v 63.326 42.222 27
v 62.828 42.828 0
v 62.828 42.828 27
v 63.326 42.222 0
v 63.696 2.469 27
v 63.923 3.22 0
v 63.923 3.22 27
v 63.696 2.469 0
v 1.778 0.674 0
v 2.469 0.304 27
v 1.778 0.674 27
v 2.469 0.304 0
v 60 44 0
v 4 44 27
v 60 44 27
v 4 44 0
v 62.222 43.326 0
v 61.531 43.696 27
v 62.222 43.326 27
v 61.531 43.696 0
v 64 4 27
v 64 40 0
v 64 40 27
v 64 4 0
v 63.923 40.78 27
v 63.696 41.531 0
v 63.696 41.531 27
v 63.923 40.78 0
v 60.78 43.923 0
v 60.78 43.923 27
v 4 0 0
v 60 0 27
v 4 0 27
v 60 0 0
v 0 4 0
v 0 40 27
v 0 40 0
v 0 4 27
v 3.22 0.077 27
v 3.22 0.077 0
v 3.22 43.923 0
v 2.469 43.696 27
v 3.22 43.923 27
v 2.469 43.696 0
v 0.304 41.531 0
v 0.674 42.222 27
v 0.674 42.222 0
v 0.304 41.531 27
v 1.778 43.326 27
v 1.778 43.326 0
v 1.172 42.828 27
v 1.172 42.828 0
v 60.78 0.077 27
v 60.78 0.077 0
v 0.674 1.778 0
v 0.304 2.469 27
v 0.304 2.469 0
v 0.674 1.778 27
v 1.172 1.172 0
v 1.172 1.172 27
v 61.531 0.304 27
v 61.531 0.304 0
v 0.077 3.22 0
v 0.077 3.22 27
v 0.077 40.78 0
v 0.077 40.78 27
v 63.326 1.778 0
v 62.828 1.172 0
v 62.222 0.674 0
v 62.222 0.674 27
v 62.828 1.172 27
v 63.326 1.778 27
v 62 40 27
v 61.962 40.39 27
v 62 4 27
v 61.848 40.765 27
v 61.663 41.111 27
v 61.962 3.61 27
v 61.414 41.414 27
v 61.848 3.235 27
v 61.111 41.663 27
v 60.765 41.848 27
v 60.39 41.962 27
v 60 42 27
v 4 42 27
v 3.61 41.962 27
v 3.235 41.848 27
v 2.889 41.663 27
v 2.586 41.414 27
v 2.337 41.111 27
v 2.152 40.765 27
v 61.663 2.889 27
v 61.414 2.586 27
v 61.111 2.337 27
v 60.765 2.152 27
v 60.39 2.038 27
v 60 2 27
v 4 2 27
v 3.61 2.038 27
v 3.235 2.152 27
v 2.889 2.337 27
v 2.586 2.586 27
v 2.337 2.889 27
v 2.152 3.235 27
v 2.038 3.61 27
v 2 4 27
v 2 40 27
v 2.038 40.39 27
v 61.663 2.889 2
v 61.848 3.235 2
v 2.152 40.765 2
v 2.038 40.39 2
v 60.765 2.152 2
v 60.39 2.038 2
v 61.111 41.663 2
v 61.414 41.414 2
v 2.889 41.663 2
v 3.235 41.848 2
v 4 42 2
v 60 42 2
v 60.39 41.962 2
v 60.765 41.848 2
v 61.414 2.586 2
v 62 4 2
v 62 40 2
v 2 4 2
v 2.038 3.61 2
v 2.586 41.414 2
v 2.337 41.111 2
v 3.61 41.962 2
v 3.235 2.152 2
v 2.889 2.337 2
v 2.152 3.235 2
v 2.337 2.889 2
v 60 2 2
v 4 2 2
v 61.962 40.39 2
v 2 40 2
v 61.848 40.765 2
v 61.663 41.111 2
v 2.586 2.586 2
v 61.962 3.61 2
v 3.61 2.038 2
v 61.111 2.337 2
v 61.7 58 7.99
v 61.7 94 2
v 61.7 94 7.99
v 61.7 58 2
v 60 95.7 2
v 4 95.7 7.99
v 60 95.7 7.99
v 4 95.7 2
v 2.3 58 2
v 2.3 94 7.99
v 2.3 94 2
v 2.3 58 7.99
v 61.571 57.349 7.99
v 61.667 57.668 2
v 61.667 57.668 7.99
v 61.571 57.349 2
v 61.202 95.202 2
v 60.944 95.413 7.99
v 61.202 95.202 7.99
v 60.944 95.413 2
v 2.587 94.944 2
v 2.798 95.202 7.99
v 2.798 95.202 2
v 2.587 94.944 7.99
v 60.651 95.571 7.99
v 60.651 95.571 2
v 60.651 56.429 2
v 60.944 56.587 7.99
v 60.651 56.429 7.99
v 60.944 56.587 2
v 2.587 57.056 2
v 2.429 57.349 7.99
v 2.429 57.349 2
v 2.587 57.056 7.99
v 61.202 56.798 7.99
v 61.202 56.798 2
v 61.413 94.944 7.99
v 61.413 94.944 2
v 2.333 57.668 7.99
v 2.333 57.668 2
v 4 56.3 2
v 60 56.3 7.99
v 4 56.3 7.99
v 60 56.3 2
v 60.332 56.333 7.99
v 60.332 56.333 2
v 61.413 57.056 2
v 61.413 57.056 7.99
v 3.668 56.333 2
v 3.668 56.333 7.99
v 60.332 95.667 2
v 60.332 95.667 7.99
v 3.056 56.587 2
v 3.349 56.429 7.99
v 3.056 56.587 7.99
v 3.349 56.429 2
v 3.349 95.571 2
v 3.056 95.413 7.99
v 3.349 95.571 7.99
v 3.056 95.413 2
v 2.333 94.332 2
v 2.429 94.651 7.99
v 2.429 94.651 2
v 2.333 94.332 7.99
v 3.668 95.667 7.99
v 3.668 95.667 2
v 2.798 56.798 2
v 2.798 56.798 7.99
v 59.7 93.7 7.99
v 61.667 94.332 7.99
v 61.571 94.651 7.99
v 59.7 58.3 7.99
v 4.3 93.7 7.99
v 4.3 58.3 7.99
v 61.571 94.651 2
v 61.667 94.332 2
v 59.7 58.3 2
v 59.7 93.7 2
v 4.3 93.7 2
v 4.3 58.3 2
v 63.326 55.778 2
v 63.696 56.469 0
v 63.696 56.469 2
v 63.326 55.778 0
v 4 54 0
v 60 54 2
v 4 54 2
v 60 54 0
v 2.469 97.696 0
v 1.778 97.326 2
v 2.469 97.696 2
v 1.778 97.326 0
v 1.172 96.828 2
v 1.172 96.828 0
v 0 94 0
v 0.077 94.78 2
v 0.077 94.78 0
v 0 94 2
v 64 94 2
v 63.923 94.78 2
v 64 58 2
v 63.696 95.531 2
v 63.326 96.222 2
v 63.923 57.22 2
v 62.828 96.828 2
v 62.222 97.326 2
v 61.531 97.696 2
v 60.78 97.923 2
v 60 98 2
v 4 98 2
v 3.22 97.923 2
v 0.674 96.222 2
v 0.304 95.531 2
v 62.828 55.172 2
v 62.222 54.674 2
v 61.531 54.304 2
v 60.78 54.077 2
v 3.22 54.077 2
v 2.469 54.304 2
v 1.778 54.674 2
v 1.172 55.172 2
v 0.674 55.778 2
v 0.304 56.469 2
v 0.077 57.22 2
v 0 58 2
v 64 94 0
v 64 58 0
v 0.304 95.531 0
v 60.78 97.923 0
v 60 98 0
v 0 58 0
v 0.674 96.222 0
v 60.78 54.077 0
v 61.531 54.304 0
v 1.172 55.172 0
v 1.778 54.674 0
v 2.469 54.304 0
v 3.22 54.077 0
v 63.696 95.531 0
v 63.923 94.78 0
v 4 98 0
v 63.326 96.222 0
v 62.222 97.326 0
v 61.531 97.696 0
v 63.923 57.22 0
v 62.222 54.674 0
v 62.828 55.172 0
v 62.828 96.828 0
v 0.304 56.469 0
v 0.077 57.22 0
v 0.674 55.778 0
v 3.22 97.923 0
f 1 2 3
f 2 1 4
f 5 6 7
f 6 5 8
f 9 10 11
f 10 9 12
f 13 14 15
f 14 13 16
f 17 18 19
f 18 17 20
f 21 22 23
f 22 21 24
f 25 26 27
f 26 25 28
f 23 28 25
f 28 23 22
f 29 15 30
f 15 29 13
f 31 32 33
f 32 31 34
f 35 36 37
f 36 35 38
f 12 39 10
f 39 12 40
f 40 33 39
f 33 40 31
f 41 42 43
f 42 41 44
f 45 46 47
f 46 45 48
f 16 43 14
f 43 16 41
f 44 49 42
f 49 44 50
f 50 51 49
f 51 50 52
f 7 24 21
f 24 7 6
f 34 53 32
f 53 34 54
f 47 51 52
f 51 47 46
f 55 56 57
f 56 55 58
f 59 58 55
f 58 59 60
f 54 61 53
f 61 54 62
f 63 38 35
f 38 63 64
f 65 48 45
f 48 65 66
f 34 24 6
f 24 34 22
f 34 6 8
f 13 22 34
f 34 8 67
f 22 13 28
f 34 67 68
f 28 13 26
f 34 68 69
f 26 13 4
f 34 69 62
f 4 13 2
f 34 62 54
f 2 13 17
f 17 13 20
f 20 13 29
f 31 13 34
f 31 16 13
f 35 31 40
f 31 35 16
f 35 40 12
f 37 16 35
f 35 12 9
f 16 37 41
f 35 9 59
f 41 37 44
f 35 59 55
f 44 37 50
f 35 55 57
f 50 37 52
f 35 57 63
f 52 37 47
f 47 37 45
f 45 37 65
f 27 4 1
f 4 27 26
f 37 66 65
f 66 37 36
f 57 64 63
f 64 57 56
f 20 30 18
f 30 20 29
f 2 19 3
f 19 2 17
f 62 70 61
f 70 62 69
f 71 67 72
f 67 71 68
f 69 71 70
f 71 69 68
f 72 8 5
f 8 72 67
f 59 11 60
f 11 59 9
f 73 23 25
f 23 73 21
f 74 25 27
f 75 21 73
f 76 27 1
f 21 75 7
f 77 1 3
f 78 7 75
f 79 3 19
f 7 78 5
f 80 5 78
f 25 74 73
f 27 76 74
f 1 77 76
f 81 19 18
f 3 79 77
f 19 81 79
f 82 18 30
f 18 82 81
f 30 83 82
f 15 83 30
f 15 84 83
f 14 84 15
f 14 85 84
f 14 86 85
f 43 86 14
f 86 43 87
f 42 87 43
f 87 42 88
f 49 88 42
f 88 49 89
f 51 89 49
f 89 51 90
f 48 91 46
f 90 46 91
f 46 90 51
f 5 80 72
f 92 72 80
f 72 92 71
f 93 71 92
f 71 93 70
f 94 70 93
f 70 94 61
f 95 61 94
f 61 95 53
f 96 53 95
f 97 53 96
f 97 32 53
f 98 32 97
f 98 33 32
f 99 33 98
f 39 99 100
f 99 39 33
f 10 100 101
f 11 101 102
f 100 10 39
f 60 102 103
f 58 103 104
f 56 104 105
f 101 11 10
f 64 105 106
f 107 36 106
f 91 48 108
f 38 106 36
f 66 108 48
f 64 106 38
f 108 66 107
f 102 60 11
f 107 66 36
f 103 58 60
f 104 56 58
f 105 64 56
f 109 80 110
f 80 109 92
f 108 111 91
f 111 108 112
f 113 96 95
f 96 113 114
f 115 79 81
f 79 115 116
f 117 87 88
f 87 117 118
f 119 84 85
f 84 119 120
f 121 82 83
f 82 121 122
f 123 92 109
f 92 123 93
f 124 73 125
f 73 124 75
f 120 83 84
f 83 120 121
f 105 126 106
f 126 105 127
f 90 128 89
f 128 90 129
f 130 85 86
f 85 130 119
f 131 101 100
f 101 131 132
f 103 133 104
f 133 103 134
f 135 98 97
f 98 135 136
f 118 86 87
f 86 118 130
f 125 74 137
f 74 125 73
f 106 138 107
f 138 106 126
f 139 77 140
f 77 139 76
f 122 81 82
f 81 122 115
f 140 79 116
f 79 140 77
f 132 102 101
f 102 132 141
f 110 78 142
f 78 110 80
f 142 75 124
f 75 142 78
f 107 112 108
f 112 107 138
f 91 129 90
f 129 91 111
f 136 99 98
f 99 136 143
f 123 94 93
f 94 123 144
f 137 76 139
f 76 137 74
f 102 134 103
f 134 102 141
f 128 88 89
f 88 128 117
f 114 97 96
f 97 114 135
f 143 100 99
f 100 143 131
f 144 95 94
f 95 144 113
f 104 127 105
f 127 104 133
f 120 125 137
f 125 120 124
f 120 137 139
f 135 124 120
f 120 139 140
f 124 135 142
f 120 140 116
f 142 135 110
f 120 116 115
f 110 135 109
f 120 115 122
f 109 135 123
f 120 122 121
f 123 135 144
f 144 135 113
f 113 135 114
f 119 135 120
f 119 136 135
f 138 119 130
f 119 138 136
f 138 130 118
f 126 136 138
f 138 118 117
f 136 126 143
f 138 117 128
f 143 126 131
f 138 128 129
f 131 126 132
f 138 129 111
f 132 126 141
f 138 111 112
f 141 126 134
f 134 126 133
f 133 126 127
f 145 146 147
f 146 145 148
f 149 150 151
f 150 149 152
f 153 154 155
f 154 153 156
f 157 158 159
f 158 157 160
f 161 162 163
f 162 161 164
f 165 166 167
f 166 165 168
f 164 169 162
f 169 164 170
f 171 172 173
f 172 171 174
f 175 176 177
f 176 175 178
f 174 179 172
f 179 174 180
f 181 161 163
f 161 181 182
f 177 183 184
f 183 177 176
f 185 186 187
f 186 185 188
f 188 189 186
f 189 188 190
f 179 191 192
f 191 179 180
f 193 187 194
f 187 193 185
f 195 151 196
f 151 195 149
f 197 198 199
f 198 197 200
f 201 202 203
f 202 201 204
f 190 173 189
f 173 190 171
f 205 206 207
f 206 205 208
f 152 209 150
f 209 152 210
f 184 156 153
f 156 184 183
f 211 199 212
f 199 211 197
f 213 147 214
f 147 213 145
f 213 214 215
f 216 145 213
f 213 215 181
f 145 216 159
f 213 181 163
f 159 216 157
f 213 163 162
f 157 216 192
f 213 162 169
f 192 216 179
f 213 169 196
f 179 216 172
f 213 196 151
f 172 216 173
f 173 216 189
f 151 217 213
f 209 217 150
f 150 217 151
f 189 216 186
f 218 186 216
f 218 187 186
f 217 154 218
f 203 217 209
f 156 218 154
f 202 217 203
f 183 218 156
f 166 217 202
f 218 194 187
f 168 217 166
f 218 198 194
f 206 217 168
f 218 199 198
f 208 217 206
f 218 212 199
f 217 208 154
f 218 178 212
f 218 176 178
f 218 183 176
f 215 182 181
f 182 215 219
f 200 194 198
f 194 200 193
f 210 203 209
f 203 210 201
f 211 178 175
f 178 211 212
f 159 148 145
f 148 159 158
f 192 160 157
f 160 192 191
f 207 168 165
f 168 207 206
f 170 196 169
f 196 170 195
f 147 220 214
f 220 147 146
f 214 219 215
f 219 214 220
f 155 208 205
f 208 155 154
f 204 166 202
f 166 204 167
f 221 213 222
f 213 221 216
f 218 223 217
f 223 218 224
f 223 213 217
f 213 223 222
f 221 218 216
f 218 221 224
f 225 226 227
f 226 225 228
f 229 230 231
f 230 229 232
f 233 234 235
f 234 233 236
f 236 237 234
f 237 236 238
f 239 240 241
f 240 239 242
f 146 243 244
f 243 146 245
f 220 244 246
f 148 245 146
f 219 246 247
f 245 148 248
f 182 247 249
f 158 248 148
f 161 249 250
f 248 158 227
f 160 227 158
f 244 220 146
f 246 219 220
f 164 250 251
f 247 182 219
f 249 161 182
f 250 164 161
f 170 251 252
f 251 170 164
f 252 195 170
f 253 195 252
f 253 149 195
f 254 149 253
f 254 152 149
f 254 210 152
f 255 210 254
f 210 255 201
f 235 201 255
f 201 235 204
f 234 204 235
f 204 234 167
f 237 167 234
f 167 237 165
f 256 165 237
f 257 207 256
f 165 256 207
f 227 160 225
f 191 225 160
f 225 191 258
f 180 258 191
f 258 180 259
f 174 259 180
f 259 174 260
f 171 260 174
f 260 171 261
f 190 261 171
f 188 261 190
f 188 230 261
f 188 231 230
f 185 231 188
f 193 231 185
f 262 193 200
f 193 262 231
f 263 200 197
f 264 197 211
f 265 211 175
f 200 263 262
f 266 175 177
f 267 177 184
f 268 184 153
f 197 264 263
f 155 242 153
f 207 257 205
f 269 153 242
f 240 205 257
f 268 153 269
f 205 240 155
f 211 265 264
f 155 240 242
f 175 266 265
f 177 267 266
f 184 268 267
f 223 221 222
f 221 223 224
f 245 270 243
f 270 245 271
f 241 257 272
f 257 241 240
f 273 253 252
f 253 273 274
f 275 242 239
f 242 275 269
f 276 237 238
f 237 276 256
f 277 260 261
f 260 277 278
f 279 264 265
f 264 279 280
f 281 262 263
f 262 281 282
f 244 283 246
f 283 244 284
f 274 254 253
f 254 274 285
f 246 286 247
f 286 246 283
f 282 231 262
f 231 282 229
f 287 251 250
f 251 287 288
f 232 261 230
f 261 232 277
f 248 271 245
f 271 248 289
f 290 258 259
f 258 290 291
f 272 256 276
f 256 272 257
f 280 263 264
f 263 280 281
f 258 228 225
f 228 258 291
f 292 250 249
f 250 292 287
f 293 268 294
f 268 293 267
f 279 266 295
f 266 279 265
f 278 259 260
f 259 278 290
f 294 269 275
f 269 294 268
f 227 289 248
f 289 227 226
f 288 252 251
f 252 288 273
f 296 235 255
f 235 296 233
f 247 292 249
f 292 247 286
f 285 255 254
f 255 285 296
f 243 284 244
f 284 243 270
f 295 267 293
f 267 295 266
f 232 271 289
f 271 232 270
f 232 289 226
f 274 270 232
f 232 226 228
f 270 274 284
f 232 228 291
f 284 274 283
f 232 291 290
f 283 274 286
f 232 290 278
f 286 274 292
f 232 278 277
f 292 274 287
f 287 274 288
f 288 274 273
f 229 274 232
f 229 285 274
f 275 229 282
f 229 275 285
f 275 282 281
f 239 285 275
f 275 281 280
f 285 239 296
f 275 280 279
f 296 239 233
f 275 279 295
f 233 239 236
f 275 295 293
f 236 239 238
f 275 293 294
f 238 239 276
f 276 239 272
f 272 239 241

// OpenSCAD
// A parametric box with a lid that sits beside it, the way the Customizer
// files on Thingiverse are written.

/* [Box] */
// Inside width
width = 60; // [20:200]
// Inside depth
depth = 40; // [20:200]
// Inside height
height = 25; // [10:100]
// Wall thickness
wall = 2; // [1:0.5:5]
// Corner radius
radius = 4; // [0:10]

/* [Lid] */
// Print the lid too
lid = true;
// Gap between lid and box
gap = 0.3; // [0.1, 0.2, 0.3, 0.4]
lid_height = 6;

/* [Hidden] */
$fn = 32;
eps = 0.01;

module rounded_box(size, r) {
    if (r <= 0) {
        cube(size);
    } else {
        hull() {
            for (x = [r, size.x - r], y = [r, size.y - r])
                translate([x, y, 0]) cylinder(r = r, h = size.z);
        }
    }
}

module box() {
    outer = [width + 2 * wall, depth + 2 * wall, height + wall];
    difference() {
        rounded_box(outer, radius);
        translate([wall, wall, wall])
            rounded_box([width, depth, height + eps], max(radius - wall, 0));
    }
}

module lid() {
    outer = [width + 2 * wall, depth + 2 * wall, wall];
    rounded_box(outer, radius);
    // A rim that fits into the box.
    translate([wall + gap, wall + gap, wall - eps])
        difference() {
            rounded_box([width - 2 * gap, depth - 2 * gap, lid_height], max(radius - wall - gap, 0));
            translate([wall, wall, -eps])
                rounded_box([width - 2 * gap - 2 * wall, depth - 2 * gap - 2 * wall, lid_height + 2 * eps],
                            max(radius - 2 * wall - gap, 0));
        }
}

box();
if (lid)
    translate([0, depth + 2 * wall + 10, 0]) lid();

echo(str("box ", width, " x ", depth, " x ", height));
